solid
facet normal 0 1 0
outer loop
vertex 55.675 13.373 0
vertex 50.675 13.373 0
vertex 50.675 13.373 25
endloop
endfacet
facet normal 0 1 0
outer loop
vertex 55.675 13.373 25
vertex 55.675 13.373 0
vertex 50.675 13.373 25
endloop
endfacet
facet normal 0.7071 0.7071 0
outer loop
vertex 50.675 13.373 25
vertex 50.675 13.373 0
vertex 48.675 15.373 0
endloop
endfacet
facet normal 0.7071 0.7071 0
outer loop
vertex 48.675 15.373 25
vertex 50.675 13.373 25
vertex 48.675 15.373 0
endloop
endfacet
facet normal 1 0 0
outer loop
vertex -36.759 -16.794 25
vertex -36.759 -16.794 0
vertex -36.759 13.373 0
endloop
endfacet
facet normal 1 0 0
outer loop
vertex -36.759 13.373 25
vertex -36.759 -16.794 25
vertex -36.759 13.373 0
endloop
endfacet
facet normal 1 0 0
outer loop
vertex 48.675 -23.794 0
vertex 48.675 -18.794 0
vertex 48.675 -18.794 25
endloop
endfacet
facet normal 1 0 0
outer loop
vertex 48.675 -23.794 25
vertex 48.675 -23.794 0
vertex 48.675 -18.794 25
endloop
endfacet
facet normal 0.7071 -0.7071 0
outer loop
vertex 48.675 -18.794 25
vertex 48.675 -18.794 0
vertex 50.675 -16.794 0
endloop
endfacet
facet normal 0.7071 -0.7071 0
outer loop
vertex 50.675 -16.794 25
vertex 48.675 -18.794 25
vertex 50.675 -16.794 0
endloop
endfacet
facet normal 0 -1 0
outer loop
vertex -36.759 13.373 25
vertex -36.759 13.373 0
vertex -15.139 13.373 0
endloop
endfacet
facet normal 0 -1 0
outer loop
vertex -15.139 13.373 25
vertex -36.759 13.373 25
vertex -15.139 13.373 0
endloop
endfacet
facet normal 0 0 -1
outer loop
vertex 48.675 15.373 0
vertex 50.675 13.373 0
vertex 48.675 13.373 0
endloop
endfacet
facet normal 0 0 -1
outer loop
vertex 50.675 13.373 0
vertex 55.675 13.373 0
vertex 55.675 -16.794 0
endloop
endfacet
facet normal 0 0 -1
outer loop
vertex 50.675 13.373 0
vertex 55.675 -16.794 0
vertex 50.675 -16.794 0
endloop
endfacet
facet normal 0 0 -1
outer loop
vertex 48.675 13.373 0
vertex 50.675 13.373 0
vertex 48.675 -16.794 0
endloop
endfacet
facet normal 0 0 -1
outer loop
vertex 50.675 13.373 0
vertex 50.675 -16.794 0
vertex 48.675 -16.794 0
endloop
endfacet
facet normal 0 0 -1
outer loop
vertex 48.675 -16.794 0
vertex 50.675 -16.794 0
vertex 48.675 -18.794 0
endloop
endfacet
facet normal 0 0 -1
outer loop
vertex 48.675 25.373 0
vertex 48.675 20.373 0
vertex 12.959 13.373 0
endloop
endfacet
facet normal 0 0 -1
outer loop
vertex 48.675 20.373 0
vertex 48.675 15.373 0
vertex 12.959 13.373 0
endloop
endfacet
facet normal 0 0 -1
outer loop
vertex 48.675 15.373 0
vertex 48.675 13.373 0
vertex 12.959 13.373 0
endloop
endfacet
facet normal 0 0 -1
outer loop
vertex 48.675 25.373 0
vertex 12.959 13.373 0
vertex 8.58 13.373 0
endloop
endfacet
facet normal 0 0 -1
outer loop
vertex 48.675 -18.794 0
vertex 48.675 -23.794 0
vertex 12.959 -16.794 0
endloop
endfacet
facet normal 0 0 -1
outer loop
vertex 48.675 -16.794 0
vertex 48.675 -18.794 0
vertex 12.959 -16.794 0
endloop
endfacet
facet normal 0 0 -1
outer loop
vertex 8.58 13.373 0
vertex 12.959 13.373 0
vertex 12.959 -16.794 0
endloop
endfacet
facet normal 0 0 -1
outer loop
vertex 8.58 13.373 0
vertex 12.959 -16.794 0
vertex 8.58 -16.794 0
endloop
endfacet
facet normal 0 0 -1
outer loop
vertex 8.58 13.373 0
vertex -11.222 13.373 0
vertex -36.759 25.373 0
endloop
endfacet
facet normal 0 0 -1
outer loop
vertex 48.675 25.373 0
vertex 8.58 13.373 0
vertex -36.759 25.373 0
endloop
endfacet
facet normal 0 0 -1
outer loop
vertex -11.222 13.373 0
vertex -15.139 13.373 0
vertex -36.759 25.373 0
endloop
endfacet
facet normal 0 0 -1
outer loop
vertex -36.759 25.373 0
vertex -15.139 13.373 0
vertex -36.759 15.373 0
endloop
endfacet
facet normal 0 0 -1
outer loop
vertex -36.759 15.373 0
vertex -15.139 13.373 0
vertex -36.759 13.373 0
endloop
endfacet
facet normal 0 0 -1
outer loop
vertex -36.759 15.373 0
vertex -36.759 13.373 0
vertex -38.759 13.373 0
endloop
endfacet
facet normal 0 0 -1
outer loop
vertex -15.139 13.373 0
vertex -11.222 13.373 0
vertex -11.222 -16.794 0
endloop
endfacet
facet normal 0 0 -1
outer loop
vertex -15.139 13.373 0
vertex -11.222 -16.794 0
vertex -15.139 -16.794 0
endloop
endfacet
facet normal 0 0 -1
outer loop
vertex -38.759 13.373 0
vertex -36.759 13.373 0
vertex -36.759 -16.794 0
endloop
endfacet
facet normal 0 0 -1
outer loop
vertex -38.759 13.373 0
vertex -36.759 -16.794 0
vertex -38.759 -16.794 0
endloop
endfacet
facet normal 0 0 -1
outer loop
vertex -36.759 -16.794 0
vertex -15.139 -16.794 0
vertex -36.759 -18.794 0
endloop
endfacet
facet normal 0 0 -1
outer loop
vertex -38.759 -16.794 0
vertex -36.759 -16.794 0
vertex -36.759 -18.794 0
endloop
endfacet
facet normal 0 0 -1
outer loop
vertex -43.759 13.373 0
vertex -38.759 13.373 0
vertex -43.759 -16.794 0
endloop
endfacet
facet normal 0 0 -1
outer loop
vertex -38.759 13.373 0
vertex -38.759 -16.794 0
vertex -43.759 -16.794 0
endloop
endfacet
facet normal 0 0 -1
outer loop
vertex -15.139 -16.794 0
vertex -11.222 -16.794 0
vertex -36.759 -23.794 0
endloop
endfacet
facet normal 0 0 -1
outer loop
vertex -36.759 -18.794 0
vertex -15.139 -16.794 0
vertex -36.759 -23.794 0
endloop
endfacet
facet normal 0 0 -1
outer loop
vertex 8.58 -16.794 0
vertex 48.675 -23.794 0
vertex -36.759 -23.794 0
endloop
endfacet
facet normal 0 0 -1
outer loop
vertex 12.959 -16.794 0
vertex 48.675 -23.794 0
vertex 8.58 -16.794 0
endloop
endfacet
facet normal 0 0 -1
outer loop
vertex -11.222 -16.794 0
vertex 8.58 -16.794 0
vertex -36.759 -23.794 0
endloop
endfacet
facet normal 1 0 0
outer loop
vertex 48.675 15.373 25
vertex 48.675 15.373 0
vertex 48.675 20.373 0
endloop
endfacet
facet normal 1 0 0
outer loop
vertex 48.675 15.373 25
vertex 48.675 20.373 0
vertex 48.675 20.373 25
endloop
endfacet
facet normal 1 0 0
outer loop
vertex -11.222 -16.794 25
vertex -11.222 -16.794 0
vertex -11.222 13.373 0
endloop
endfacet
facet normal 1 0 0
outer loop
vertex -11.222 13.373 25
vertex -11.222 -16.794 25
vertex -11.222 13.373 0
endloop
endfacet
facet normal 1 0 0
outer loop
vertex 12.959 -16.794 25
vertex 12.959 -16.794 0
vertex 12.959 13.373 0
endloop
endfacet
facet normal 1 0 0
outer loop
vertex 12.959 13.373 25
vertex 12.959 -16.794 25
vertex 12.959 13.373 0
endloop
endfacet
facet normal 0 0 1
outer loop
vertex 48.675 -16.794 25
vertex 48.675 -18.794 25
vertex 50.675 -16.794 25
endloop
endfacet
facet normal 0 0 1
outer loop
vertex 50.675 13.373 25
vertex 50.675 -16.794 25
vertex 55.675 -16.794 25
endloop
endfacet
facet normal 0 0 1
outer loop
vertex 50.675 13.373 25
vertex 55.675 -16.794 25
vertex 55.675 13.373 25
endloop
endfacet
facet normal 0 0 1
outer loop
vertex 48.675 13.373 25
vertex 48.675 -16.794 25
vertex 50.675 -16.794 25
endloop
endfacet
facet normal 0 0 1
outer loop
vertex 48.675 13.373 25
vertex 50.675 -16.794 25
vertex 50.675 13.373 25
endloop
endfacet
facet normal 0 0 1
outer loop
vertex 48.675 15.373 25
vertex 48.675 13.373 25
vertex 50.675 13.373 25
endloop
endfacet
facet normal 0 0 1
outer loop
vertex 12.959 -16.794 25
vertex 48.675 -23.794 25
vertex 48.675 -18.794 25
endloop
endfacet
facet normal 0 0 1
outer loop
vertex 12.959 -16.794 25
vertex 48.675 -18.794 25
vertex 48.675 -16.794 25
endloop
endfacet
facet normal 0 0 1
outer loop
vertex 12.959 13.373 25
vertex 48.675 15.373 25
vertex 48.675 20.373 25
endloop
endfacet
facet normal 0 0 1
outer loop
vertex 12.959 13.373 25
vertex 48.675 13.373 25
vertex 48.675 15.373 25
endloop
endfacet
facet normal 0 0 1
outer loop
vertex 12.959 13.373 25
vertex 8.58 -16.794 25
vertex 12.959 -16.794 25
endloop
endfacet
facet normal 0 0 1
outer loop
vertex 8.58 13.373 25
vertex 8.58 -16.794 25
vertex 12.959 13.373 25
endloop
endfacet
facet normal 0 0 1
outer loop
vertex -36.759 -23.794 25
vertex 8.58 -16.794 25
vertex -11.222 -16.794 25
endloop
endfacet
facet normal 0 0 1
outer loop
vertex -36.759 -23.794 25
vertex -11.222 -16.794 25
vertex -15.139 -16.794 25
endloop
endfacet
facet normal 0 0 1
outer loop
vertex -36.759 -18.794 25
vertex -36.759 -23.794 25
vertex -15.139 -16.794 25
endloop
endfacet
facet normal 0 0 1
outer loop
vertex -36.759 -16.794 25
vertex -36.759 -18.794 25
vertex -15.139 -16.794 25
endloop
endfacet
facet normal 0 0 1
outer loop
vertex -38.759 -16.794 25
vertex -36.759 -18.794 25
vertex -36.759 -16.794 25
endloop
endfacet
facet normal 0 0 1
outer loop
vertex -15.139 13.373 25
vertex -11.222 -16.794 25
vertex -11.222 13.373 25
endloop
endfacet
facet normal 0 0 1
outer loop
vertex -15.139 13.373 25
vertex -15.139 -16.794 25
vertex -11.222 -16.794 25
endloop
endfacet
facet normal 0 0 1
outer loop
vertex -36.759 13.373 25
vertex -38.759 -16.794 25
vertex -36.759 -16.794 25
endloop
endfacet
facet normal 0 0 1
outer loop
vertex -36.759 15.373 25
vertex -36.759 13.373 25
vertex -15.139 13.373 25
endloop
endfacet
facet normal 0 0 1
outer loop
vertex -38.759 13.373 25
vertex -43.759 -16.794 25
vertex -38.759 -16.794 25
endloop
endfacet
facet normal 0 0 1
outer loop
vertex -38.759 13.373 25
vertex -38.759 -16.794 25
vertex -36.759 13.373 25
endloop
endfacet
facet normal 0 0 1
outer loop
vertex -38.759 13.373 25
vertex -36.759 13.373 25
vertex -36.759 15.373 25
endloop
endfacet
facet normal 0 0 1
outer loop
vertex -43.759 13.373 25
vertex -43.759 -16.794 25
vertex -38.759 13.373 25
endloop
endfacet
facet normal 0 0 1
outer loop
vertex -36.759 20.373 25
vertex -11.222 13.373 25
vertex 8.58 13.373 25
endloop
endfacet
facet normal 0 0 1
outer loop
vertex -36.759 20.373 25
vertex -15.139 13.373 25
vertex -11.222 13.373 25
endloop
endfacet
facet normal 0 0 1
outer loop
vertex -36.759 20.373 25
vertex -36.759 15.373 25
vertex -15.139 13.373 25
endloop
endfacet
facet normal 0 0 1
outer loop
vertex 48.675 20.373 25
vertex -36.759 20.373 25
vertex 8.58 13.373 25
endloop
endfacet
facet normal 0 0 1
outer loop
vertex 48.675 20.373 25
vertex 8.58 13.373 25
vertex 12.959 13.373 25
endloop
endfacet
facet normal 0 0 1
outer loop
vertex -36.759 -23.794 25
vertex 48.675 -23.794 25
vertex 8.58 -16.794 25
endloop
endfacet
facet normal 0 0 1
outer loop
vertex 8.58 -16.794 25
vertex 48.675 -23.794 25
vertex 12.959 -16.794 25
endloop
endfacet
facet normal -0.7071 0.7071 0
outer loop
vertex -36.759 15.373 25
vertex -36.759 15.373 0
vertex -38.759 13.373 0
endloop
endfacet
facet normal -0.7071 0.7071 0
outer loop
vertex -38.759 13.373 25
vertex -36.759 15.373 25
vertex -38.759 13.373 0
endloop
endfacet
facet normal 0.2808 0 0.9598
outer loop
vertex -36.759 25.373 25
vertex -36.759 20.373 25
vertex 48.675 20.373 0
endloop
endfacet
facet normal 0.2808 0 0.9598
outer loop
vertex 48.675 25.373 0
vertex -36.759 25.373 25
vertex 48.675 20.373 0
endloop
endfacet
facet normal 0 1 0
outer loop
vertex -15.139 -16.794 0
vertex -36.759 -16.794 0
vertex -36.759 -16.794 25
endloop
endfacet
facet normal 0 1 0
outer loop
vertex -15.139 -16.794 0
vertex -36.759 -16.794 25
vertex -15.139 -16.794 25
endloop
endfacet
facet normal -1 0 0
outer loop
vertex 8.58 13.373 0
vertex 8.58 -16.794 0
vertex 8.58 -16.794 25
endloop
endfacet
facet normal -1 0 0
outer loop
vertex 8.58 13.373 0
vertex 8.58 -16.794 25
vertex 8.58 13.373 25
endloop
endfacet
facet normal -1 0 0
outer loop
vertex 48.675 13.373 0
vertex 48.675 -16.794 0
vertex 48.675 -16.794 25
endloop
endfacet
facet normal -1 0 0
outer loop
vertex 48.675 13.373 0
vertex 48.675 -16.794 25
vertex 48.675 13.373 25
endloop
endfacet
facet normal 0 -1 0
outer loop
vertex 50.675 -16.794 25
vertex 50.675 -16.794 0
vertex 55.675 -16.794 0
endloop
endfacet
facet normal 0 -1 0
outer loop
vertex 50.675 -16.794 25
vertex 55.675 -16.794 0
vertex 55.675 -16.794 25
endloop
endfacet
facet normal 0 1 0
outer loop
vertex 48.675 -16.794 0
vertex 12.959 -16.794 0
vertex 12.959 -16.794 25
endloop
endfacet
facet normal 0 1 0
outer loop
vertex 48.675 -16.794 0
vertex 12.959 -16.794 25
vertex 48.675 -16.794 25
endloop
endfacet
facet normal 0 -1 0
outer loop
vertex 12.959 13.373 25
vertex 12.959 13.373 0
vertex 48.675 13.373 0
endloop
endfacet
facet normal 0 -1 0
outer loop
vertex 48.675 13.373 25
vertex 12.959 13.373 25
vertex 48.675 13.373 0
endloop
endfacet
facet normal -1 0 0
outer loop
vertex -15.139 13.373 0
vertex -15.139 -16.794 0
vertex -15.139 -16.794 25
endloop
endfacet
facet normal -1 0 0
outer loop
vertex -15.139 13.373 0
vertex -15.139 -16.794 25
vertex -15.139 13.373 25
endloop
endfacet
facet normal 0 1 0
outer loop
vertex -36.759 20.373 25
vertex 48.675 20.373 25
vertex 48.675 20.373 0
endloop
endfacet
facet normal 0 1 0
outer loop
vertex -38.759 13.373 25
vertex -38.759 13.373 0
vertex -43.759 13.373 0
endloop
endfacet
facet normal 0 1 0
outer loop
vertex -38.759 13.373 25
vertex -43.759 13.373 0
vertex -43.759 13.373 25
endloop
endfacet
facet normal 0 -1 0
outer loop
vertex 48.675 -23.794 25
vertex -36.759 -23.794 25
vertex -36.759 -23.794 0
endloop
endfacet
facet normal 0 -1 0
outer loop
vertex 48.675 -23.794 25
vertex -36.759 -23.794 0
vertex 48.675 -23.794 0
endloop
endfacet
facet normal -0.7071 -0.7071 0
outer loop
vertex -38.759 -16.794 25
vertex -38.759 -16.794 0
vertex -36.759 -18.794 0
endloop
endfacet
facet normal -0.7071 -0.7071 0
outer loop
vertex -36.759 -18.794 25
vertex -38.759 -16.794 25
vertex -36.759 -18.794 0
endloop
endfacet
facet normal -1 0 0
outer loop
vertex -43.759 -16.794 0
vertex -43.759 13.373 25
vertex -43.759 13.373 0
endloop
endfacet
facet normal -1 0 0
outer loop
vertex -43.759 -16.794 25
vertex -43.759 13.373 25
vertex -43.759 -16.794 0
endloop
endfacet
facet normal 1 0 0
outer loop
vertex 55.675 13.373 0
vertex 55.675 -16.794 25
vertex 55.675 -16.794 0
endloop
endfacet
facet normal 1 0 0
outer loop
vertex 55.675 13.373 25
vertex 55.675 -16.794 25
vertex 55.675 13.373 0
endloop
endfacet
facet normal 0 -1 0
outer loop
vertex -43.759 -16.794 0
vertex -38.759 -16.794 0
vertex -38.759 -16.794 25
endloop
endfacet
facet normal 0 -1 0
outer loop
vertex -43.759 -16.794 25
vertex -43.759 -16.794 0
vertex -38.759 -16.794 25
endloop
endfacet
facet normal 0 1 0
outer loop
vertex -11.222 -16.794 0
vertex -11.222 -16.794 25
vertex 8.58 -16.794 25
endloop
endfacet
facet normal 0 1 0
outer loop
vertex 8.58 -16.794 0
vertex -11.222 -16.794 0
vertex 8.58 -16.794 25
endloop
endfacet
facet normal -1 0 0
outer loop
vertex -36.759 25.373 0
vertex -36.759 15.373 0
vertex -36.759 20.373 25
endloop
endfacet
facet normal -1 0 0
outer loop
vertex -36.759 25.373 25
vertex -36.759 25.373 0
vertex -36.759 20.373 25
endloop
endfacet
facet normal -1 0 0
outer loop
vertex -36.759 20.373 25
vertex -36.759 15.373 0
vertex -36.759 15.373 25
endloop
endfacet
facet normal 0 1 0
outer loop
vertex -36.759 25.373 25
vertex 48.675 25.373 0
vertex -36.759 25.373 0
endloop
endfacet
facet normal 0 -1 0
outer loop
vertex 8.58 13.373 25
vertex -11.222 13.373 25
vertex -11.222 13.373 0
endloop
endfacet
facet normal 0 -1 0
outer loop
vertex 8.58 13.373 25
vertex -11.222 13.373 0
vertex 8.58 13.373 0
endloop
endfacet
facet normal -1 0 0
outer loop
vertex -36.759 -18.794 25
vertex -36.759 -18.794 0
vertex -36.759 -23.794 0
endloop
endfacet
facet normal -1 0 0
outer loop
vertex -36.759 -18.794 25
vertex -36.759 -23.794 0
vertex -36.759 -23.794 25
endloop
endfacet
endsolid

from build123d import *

# Parameters (mm, degrees)
F0_W      = 21.620078
F0_H      = 30.16656
F0_W_2    = 19.802009
F0_W_3    = 35.716062
F1_DEPTH  = 25
F2_W      = 85.43355
F2_H      = 25
F3_DEPTH  = 5
F4_W      = 85.43355
F4_H      = 25
F5_DEPTH  = 5
F6_W      = 30.16656
F6_H      = 25
F7_DEPTH  = 5
F8_W      = 30.16656
F8_H      = 25
F9_DEPTH  = 5
F11_DEPTH = 5


with BuildPart() as f1:
    # F0 (on Top) → F1 (new body)
    with BuildSketch(Plane.XY):
        Polygon((-36.758605, 15.372929), (-38.758605, 13.372929), (-38.758605, -16.793631), (-36.758605, -18.793631), (48.674945, -18.793631), (50.674945, -16.793631), (50.674945, 13.372929), (48.674945, 15.372929), align=None)
        with Locations((-25.948566, -1.710351)):
            Rectangle(F0_W, F0_H, mode=Mode.SUBTRACT)
        with Locations((-1.321006, -1.710351)):
            Rectangle(F0_W_2, F0_H, mode=Mode.SUBTRACT)
        with Locations((30.816914, -1.710351)):
            Rectangle(F0_W_3, F0_H, mode=Mode.SUBTRACT)
    extrude(amount=F1_DEPTH)

    # F2 (on face) → F3 (join)
    with BuildSketch(Plane(origin=(0, 15.372929, 0), x_dir=(-1, 0, 0), z_dir=(0, 1, 0))):
        with Locations((-5.95817, 12.5)):
            Rectangle(F2_W, F2_H)
    extrude(amount=F3_DEPTH)

    # F4 (on face) → F5 (join)
    with BuildSketch(Plane.XZ.offset(18.793631)):
        with Locations((5.95817, 12.5)):
            Rectangle(F4_W, F4_H)
    extrude(amount=F5_DEPTH)

    # F6 (on face) → F7 (join)
    with BuildSketch(Plane(origin=(-38.758605, 0, 0), x_dir=(0, -1, 0), z_dir=(-1, 0, 0))):
        with Locations((1.710351, 12.5)):
            Rectangle(F6_W, F6_H)
    extrude(amount=F7_DEPTH)

    # F8 (on face) → F9 (join)
    with BuildSketch(Plane.YZ.offset(50.674945)):
        with Locations((-1.710351, 12.5)):
            Rectangle(F8_W, F8_H)
    extrude(amount=F9_DEPTH)

    # F10 (on face) → F11 (join)
    with BuildSketch(Plane(origin=(0, 20.372929, 0), x_dir=(-1, 0, 0), z_dir=(0, 1, 0))):
        Polygon((36.758605, 25), (-48.674945, 0), (36.758605, 0), align=None)
    extrude(amount=F11_DEPTH)


solid = f1.part
